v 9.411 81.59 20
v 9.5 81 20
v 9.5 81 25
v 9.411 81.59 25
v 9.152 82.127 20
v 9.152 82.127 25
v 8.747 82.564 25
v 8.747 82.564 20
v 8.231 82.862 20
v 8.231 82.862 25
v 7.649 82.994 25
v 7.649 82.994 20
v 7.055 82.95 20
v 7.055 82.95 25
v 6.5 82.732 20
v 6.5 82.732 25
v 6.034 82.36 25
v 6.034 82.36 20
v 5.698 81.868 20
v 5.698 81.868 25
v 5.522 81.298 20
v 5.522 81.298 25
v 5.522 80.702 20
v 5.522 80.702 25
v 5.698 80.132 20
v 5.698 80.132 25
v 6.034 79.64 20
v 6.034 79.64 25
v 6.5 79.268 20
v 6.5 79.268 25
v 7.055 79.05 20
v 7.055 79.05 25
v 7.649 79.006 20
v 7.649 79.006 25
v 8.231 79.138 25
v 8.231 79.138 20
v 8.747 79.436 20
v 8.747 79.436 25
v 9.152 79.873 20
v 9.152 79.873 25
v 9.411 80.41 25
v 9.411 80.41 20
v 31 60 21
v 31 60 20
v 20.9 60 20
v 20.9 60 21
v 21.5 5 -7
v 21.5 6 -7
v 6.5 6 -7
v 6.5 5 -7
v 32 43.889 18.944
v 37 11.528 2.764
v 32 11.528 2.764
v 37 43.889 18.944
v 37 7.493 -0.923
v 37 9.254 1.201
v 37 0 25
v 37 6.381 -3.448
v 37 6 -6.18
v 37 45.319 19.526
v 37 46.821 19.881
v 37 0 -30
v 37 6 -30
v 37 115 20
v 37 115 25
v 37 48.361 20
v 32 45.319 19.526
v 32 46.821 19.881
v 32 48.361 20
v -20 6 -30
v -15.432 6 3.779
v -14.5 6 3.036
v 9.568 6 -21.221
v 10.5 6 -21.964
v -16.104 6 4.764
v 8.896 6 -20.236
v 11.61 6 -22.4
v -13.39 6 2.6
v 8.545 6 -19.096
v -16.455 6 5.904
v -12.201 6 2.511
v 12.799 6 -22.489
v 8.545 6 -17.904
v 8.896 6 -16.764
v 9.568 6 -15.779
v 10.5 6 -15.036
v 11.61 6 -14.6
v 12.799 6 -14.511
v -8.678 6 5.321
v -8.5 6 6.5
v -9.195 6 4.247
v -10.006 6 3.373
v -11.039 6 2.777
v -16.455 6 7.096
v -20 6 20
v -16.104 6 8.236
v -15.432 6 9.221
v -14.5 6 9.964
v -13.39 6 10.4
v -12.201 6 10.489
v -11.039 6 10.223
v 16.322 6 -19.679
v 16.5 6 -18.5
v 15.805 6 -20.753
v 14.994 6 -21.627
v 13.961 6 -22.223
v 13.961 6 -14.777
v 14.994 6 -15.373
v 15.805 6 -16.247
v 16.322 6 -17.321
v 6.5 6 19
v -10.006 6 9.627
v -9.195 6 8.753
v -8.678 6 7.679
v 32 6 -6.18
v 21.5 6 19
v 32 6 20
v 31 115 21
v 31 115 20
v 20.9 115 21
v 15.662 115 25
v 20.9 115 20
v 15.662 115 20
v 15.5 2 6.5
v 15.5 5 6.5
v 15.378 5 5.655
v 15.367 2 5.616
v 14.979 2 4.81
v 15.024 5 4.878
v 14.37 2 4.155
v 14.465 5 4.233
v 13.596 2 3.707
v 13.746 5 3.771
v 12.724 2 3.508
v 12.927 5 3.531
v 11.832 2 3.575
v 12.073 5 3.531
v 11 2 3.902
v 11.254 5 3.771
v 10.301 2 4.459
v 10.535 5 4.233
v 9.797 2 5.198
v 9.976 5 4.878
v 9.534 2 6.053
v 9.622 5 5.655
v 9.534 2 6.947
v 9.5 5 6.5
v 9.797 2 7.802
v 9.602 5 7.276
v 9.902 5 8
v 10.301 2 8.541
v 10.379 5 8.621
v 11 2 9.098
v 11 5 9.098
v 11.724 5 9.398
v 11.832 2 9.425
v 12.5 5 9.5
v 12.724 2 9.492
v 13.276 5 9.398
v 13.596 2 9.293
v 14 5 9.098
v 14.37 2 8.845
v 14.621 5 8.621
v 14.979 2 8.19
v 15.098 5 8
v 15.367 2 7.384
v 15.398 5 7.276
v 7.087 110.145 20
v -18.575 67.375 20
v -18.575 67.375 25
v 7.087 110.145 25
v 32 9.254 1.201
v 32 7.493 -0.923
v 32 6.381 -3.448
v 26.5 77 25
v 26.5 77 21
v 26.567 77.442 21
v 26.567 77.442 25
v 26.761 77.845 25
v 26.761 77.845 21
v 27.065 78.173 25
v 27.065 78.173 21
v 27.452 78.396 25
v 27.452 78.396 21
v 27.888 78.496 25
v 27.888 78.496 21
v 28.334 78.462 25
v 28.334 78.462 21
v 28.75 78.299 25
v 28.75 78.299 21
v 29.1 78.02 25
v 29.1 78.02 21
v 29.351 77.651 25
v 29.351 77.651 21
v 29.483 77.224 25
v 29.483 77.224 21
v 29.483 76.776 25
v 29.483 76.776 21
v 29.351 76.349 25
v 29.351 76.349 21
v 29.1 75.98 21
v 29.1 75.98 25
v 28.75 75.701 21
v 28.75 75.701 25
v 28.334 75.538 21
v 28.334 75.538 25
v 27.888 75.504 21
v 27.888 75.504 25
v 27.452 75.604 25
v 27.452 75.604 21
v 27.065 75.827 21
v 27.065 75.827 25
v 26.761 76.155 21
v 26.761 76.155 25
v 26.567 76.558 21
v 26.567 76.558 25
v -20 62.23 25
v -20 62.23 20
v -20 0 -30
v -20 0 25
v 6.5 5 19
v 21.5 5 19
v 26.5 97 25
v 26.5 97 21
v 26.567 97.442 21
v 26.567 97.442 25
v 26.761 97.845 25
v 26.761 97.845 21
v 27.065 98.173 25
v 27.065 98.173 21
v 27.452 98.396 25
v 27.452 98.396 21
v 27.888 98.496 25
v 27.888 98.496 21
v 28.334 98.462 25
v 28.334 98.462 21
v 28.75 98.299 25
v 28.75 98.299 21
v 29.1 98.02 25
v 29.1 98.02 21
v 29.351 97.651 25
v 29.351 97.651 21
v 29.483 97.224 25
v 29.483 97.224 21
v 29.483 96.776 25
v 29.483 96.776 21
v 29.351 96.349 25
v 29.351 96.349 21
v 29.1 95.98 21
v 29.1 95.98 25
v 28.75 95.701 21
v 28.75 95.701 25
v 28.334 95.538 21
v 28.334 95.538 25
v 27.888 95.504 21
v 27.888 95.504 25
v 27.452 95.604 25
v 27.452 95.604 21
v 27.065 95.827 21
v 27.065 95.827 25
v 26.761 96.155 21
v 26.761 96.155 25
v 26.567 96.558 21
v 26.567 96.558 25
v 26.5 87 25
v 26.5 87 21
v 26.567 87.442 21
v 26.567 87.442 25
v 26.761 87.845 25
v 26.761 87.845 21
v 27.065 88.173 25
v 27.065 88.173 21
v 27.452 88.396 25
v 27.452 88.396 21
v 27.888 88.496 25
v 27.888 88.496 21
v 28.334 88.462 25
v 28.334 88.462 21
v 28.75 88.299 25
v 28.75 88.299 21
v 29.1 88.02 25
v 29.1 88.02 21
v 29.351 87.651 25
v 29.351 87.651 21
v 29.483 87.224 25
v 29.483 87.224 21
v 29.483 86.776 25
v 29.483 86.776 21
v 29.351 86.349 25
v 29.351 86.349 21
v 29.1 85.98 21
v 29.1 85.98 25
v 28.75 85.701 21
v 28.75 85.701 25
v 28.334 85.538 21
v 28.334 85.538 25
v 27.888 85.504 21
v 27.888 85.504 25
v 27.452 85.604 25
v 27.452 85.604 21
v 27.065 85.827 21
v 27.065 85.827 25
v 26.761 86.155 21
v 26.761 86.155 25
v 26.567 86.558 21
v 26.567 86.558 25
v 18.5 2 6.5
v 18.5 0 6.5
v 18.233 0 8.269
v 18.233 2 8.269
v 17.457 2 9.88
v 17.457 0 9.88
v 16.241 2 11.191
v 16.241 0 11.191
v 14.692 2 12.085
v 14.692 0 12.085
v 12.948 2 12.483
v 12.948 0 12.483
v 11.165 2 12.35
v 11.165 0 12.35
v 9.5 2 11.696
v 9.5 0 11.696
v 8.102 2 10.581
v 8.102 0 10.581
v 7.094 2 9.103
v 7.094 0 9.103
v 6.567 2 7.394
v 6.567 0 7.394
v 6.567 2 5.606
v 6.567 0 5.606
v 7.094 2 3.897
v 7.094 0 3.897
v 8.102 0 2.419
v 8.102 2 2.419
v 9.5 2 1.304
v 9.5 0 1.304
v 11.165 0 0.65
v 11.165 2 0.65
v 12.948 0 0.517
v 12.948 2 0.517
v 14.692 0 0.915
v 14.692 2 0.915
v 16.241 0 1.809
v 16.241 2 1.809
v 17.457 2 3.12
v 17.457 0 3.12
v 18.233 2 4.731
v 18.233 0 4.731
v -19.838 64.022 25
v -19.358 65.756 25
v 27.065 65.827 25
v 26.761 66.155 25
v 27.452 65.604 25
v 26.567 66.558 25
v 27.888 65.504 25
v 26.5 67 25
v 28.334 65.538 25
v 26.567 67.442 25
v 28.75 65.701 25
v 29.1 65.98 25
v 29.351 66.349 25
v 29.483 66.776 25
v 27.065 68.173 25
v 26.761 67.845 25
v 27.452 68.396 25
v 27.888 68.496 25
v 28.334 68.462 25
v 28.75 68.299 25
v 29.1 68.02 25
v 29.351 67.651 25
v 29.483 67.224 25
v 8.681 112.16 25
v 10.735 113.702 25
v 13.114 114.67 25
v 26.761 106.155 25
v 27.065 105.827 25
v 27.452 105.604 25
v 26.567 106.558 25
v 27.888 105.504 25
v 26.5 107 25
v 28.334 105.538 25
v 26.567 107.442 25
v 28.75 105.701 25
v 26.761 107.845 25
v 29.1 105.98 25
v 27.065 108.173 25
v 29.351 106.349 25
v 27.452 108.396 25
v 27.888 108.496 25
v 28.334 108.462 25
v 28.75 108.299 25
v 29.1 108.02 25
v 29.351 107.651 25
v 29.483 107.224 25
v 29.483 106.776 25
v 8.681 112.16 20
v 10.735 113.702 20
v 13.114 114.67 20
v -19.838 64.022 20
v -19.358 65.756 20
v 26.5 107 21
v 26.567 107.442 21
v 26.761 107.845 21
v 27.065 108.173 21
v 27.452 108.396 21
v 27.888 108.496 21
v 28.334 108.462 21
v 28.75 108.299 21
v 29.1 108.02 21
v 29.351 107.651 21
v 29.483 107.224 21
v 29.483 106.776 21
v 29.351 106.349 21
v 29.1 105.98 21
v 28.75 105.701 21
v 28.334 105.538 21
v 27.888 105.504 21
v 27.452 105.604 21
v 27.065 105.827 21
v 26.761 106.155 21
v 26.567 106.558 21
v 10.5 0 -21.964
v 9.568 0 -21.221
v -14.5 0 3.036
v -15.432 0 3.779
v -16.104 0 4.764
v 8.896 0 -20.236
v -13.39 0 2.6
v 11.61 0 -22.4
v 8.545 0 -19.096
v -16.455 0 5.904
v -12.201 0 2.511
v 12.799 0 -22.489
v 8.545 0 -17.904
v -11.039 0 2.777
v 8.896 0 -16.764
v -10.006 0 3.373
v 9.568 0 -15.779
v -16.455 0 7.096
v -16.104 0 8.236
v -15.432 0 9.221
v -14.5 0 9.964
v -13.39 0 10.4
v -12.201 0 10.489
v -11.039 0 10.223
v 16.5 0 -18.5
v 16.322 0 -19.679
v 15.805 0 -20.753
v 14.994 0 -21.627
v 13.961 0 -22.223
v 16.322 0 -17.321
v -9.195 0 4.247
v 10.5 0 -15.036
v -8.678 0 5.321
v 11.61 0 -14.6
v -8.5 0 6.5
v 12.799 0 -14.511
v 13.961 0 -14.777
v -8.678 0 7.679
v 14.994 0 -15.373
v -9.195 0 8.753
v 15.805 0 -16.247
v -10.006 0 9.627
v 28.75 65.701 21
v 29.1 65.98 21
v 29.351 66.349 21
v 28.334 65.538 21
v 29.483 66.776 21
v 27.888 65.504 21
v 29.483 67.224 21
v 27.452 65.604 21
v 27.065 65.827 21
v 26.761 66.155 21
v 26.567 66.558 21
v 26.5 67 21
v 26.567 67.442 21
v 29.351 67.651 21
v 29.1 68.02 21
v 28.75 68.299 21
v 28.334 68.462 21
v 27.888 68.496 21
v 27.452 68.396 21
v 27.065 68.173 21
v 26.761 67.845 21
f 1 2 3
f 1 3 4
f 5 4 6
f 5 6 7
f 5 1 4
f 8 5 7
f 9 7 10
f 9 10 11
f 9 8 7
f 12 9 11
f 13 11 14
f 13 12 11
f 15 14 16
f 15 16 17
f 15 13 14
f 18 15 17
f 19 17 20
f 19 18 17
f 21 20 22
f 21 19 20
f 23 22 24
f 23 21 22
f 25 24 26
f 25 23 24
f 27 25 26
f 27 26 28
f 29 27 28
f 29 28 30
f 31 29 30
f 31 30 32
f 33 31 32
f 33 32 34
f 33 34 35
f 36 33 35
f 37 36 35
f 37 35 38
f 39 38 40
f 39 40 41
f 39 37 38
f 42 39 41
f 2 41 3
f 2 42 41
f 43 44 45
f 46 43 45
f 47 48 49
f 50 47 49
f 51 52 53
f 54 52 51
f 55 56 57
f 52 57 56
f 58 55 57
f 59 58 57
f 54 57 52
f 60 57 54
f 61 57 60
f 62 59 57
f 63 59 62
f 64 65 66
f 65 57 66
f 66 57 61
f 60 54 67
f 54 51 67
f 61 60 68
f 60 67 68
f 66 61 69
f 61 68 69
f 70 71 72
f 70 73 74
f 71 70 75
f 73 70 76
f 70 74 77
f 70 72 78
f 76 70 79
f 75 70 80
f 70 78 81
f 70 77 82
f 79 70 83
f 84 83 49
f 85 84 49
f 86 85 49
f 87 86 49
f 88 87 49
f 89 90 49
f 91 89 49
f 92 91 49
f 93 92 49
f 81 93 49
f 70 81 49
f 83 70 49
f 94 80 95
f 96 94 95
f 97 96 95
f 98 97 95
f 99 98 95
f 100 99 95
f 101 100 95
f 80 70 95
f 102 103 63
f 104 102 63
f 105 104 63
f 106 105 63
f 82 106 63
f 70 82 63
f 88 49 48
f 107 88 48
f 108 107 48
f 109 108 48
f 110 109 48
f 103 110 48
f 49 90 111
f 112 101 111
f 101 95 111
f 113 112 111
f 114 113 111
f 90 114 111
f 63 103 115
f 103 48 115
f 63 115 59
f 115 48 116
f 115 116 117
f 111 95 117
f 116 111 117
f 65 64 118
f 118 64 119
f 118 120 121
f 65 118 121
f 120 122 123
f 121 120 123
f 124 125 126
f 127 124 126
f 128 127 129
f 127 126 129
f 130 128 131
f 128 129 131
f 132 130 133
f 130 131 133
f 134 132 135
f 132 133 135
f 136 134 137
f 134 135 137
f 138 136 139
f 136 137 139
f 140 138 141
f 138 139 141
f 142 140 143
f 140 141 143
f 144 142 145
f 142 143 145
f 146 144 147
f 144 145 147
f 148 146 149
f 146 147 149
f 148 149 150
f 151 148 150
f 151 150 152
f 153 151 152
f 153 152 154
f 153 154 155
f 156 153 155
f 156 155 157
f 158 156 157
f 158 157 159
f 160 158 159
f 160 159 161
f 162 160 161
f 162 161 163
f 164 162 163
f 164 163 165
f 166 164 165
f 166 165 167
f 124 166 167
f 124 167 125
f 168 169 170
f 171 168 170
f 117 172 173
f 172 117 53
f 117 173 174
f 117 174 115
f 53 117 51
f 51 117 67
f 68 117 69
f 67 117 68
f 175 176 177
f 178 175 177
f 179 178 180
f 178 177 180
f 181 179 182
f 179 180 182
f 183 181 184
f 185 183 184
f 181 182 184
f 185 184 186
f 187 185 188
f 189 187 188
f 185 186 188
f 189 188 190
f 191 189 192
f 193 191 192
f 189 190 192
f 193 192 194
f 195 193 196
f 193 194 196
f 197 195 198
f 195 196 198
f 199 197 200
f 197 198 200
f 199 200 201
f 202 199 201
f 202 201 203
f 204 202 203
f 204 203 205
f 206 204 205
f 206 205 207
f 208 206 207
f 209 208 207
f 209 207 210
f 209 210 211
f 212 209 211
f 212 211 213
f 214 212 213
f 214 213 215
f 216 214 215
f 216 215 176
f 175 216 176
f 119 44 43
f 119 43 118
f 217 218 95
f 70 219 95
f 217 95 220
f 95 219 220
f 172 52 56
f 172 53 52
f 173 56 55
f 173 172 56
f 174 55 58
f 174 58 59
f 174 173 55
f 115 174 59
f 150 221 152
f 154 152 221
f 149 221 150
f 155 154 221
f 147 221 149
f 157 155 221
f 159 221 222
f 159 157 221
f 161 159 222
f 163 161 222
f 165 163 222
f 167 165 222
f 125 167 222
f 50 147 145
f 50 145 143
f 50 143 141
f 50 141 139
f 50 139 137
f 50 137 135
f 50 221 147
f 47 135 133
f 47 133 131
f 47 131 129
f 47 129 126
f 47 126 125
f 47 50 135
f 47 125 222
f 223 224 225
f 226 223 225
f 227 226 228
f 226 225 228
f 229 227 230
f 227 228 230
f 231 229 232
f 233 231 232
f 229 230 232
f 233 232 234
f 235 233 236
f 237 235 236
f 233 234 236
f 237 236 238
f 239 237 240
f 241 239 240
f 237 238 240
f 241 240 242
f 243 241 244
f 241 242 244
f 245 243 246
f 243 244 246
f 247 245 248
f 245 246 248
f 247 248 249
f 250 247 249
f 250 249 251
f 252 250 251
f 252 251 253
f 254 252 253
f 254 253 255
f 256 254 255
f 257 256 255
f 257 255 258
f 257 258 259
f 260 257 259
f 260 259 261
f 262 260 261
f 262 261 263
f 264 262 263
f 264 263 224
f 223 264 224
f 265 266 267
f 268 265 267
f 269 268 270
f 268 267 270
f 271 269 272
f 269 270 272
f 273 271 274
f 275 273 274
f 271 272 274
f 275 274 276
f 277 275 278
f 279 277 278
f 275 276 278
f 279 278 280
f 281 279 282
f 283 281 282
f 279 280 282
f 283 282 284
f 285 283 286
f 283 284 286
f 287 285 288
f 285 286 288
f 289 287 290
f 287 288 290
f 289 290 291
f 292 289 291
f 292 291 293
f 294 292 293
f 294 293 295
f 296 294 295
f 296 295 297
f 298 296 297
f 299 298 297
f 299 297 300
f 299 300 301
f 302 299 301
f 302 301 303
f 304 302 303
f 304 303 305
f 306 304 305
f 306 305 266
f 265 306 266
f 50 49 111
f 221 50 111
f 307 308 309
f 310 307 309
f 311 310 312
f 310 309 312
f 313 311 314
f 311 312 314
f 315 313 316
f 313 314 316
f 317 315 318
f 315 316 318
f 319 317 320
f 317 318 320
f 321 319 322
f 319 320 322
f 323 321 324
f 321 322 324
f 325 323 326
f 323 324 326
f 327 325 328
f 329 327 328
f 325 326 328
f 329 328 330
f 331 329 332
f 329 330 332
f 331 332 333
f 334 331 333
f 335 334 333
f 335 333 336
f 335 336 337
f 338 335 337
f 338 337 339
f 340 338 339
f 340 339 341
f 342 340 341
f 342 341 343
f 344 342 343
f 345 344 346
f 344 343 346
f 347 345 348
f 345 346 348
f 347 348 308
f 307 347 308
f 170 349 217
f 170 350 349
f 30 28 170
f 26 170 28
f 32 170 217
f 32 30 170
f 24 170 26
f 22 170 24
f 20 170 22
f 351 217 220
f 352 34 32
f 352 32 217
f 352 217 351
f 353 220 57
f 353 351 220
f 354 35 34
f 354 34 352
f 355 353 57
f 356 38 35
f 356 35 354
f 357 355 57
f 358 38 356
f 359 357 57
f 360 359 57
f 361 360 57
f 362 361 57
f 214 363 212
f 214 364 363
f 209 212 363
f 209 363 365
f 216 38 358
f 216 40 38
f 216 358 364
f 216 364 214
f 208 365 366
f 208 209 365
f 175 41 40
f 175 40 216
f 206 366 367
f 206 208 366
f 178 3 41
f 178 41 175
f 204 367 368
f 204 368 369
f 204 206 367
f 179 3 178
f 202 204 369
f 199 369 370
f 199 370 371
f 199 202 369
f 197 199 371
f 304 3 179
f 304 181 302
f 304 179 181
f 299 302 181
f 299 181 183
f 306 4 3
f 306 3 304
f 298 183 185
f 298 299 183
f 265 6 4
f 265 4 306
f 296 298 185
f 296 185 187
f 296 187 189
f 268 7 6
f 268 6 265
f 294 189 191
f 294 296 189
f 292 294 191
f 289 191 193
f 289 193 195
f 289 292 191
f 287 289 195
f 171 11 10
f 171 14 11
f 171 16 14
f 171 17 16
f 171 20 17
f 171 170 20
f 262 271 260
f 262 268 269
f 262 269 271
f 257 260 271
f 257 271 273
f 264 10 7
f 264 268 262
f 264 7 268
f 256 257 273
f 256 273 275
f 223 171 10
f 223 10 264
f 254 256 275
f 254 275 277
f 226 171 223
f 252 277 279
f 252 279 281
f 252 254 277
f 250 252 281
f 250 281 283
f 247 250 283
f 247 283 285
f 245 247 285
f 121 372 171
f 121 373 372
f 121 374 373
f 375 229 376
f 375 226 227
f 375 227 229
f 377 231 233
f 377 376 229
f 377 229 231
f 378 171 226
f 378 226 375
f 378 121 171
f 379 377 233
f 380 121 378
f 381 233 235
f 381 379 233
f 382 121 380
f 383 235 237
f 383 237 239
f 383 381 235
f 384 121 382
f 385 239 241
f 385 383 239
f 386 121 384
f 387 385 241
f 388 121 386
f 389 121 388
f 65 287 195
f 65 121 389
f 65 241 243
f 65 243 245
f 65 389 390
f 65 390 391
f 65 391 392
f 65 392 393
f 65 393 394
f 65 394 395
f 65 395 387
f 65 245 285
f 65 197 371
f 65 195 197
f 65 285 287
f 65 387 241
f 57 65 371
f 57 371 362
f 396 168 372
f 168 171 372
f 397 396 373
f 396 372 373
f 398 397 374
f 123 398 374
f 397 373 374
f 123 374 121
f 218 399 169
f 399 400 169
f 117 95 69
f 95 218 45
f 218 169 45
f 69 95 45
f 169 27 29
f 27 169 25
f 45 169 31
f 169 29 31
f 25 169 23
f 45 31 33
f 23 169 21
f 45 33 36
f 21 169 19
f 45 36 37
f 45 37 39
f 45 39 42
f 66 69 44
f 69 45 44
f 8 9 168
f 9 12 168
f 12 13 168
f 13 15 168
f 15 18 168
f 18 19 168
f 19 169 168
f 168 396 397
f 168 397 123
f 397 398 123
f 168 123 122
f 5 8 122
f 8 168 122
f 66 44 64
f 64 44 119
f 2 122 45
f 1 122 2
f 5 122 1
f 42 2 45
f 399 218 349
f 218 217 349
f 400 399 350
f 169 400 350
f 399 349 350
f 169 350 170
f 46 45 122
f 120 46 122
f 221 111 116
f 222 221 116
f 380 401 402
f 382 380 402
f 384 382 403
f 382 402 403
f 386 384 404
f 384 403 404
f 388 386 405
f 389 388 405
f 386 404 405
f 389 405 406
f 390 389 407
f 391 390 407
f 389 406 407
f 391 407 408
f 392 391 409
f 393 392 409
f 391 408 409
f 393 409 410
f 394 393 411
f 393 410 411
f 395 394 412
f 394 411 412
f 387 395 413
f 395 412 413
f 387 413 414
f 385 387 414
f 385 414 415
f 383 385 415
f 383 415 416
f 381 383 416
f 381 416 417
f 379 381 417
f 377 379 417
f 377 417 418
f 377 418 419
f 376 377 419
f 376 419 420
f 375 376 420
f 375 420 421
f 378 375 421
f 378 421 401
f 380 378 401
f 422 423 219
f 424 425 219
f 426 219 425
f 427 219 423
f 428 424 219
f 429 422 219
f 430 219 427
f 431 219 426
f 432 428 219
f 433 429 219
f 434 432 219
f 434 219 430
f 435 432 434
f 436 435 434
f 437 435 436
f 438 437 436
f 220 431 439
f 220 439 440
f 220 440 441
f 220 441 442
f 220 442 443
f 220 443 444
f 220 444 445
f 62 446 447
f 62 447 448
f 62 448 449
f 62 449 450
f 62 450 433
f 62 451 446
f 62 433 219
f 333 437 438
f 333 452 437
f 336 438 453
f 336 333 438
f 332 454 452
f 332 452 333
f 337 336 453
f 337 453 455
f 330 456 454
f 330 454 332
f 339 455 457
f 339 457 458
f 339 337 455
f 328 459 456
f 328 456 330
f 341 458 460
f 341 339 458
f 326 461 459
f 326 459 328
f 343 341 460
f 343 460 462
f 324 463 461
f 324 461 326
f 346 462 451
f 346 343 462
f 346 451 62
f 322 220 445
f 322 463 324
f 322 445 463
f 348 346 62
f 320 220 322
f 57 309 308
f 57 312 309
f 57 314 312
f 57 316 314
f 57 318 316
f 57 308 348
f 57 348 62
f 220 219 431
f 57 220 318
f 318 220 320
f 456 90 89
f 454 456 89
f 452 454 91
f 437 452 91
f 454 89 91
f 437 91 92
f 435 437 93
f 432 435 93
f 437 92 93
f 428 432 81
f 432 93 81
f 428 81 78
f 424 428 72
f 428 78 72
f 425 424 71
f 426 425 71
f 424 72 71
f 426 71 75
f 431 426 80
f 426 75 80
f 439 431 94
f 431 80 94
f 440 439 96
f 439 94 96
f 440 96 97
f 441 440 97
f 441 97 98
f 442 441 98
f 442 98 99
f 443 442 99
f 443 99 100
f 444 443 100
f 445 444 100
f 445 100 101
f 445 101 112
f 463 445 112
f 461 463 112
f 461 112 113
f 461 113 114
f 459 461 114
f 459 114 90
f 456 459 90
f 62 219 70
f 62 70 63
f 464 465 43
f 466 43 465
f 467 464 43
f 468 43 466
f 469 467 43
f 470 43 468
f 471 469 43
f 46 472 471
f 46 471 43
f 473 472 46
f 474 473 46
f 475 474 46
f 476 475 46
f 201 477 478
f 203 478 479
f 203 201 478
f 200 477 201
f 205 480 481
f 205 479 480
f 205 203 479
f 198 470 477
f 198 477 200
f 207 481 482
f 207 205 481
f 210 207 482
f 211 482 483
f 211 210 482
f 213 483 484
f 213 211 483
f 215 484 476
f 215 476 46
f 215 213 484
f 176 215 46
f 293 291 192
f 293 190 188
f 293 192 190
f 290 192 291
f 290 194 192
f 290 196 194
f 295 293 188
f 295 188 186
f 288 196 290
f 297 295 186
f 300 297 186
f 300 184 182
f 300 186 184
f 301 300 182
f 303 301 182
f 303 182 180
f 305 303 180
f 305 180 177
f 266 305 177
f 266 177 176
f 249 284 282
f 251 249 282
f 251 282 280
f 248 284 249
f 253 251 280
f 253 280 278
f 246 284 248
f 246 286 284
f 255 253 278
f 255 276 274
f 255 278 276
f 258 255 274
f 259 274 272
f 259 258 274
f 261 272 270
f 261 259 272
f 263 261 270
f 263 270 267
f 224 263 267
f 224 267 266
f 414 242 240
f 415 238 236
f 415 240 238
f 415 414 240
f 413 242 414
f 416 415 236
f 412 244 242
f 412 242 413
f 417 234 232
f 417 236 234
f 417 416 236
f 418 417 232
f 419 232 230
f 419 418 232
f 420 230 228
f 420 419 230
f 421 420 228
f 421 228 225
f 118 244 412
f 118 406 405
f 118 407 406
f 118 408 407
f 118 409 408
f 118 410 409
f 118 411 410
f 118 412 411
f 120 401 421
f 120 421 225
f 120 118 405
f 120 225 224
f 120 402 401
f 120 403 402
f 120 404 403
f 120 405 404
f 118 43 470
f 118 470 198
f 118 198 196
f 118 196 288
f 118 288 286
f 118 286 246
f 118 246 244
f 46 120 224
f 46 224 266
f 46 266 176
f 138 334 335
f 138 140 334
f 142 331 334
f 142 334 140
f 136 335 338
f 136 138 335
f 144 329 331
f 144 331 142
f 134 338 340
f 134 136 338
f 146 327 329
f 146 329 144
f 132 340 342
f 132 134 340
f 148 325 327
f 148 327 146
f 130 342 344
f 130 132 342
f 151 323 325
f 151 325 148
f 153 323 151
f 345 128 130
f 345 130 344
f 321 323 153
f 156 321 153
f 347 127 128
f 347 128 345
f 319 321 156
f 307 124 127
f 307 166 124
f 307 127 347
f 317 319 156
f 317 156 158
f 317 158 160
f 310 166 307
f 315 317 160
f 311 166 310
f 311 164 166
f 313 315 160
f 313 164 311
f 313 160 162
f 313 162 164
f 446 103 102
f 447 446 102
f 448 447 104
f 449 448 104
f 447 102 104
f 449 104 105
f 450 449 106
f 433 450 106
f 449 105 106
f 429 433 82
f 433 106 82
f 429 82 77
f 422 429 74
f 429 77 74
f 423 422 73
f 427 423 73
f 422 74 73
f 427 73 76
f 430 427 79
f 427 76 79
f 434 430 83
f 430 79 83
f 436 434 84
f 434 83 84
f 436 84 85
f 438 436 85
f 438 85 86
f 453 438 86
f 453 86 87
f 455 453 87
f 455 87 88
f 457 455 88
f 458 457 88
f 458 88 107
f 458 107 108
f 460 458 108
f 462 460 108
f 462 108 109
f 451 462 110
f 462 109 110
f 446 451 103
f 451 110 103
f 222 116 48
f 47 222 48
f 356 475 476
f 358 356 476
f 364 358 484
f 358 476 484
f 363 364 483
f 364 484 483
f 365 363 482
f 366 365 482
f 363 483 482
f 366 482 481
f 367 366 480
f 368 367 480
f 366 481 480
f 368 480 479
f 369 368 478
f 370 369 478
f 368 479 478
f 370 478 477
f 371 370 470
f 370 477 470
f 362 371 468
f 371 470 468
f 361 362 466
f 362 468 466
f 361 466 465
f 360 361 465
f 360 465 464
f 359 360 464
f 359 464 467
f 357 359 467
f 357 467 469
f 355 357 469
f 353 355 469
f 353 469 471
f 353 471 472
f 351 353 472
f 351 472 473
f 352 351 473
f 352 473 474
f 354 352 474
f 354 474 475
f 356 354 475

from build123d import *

# Parameters (mm, degrees)
SKETCH_1_W                 = 40
SKETCH_1_H                 = 10
SKETCH_1_H_2               = 15
EXTRUDE_1_DEPTH            = 6
SKETCH_3_R                 = 3
SKETCH_3_R_2               = 4
CUT_EXTRUDE_1_DEPTH        = 7
CUT_EXTRUDE_2_DEPTH        = 1
SKETCH_6_R                 = 2
EXTRUDE_2_DEPTH            = 5
SKETCH_7_R                 = 1.5
CUT_EXTRUDE_4_DEPTH        = 6
SKETCH_8_W                 = 10.1
SKETCH_8_H                 = 55
SKETCH_8_R                 = 1.5
CUT_EXTRUDE_5_DEPTH        = 1
SKETCH_9_R                 = 6
CUT_EXTRUDE_6_DEPTH        = 2
SKETCH_10_W                = 65
SKETCH_10_H                = 15
EXTRUDE_3_DEPTH            = 6
SKETCH_11_R                = 4
CUT_EXTRUDE_7_DEPTH        = 6
SKETCH_12_W                = 161.966486937
SKETCH_12_H                = 199.843871975
CUT_EXTRUDE_8_DEPTH        = 8
PATTERN_LINEAR_1_COUNT     = 3
PATTERN_LINEAR_1_PITCH     = 10
PATTERN_LINEAR_1_COL_COUNT = 3
PATTERN_LINEAR_1_COL_PITCH = 10
CHAMFER_1_SIZE             = 30
CHAMFER_1_SIZE2            = 50
FILLET_1_R                 = 10
EXTRUDE_4_DEPTH            = 5
FILLET_2_R                 = 10


with BuildPart() as part:
    # 草图1 → 凸台-拉伸1 (new body)
    with BuildSketch(Plane(origin=(0, 0, 0), x_dir=(1, 0, 0), z_dir=(0, 1, 0))):
        with Locations((20, -5)):
            Rectangle(SKETCH_1_W, SKETCH_1_H)
        with Locations((20, 7.5)):
            Rectangle(SKETCH_1_W, SKETCH_1_H_2)
        with Locations((20, -15)):
            Rectangle(SKETCH_1_W, SKETCH_1_H)
        Polygon((-20, 15), (-20, -20), (0, -20), (0, -10), (0, 0), (0, 15), align=None)
        Polygon((45, -20), (40, -20), (40, -10), (40, 0), (40, 15), (45, 15), align=None)
    extrude(amount=EXTRUDE_1_DEPTH)

    # 草图3 → 切除-拉伸1 (cut, through all)
    with BuildSketch(Plane(origin=(0, 6, 0), x_dir=(1, 0, 0), z_dir=(0, 1, 0))):
        with Locations((12.5, -6.5)):
            Circle(SKETCH_3_R)
        with Locations((-12.5, -6.5)):
            Circle(SKETCH_3_R_2)
    extrude(amount=-CUT_EXTRUDE_1_DEPTH, mode=Mode.SUBTRACT)

    # 草图4 → 切除-拉伸2 (cut)
    with BuildSketch(Plane(origin=(0, 6, 0), x_dir=(1, 0, 0), z_dir=(0, 1, 0))):
        with BuildLine():
            Line((6.5, -6.5), (9.5, -6.5))
            ThreePointArc((9.5, -6.5), (12.5, -3.5), (15.5, -6.5))
            ThreePointArc((15.5, -6.5), (14.621320344, -8.621320344), (12.5, -9.5))
            Line((12.5, -9.5), (12.5, -19))
            Line((12.5, -19), (21.5, -19))
            Line((21.5, -19), (21.5, 7))
            Line((21.5, 7), (6.5, 7))
            Line((6.5, 7), (6.5, -6.5))
        make_face()
        with BuildLine():
            ThreePointArc((12.5, -9.5), (10.378679656, -8.621320344), (9.5, -6.5))
            Line((9.5, -6.5), (6.5, -6.5))
            Line((6.5, -6.5), (6.5, -19))
            Line((6.5, -19), (12.5, -19))
            Line((12.5, -19), (12.5, -9.5))
        make_face()
    extrude(amount=-CUT_EXTRUDE_2_DEPTH, mode=Mode.SUBTRACT)

    # 草图6 → 凸台-拉伸2 (add)
    with BuildSketch(Plane.XY.offset(20)):
        Polygon((-20, 0), (12.5, 0), (45, 0), (45, 115), (-20, 115), align=None)
        with Locations((7.5, 81)):
            Circle(SKETCH_6_R, mode=Mode.SUBTRACT)
    extrude(amount=EXTRUDE_2_DEPTH)

    # 草图7 → 切除-拉伸4 (cut, through all)
    with BuildSketch(Plane(origin=(0, 0, 20), x_dir=(-1, 0, 0), z_dir=(0, 0, -1))):
        with Locations((-28, 87)):
            Circle(SKETCH_7_R)
    cut_extrude_4 = extrude(amount=-CUT_EXTRUDE_4_DEPTH, mode=Mode.SUBTRACT)

    # 草图8 → 切除-拉伸5 (cut)
    with BuildSketch(Plane(origin=(0, 0, 20), x_dir=(-1, 0, 0), z_dir=(0, 0, -1))):
        with Locations((-25.95, 87.5)):
            Rectangle(SKETCH_8_W, SKETCH_8_H)
        with Locations((-28, 87)):
            Circle(SKETCH_8_R, mode=Mode.SUBTRACT)
    extrude(amount=-CUT_EXTRUDE_5_DEPTH, mode=Mode.SUBTRACT)

    # 草图9 → 切除-拉伸6 (cut)
    with BuildSketch(Plane.XZ):
        with Locations((12.5, 6.5)):
            Circle(SKETCH_9_R)
    extrude(amount=-CUT_EXTRUDE_6_DEPTH, mode=Mode.SUBTRACT)

    # 草图10 → 凸台-拉伸3 (add)
    with BuildSketch(Plane.XZ):
        with Locations((12.5, -22.5)):
            Rectangle(SKETCH_10_W, SKETCH_10_H)
    extrude(amount=-EXTRUDE_3_DEPTH)

    # 草图11 → 切除-拉伸7 (cut)
    with BuildSketch(Plane(origin=(0, 6, 0), x_dir=(1, 0, 0), z_dir=(0, 1, 0))):
        with Locations((12.5, 18.5)):
            Circle(SKETCH_11_R)
    extrude(amount=-CUT_EXTRUDE_7_DEPTH, mode=Mode.SUBTRACT)

    # 草图12 → 切除-拉伸8 (cut)
    with BuildSketch(Plane(origin=(45, 0, 0), x_dir=(0, 0, -1), z_dir=(1, 0, 0))):
        with Locations((-40.373481837, 95.367627035)):
            Rectangle(SKETCH_12_W, SKETCH_12_H)
    extrude(amount=-CUT_EXTRUDE_8_DEPTH, mode=Mode.SUBTRACT)

    # 阵列(线性)1: 切除-拉伸4 ×3
    with Locations(*[(0, -i * PATTERN_LINEAR_1_PITCH, 0) for i in range(1, PATTERN_LINEAR_1_COUNT)]):
        add(cut_extrude_4, mode=Mode.SUBTRACT)

    # 阵列(线性)1 col: 切除-拉伸4 ×3
    with Locations(*[(0, i * PATTERN_LINEAR_1_COL_PITCH, 0) for i in range(1, PATTERN_LINEAR_1_COL_COUNT)]):
        add(cut_extrude_4, mode=Mode.SUBTRACT)

    # 倒角1
    chamfer_1_edges = [part.edges().sort_by_distance(p)[0] for p in [
        (-20, 115, 22.5),
    ]]
    chamfer_1_side = [part.faces().sort_by_distance(p)[0] for p in [
        (7.858875955, 115, 22.573481266),
    ]]
    chamfer(chamfer_1_edges, length=CHAMFER_1_SIZE, length2=CHAMFER_1_SIZE2, reference=chamfer_1_side[0])

    # 圆角1
    fillet_1_edges = [part.edges().sort_by_distance(p)[0] for p in [
        (-20, 65, 22.5),
        (10, 115, 22.5),
    ]]
    fillet(fillet_1_edges, radius=FILLET_1_R)

    # 草图13 → 凸台-拉伸4 (add)
    with BuildSketch(Plane(origin=(37, 0, 0), x_dir=(0, 0, -1), z_dir=(1, 0, 0))):
        Polygon((-20, 6), (0, 6), (-20, 46), align=None)
    extrude(amount=-EXTRUDE_4_DEPTH)

    # 圆角2
    fillet_2_edges = [part.edges().sort_by_distance(p)[0] for p in [
        (34.5, 46, 20),
        (34.5, 6, 0),
    ]]
    fillet(fillet_2_edges, radius=FILLET_2_R)


solid = part.part
